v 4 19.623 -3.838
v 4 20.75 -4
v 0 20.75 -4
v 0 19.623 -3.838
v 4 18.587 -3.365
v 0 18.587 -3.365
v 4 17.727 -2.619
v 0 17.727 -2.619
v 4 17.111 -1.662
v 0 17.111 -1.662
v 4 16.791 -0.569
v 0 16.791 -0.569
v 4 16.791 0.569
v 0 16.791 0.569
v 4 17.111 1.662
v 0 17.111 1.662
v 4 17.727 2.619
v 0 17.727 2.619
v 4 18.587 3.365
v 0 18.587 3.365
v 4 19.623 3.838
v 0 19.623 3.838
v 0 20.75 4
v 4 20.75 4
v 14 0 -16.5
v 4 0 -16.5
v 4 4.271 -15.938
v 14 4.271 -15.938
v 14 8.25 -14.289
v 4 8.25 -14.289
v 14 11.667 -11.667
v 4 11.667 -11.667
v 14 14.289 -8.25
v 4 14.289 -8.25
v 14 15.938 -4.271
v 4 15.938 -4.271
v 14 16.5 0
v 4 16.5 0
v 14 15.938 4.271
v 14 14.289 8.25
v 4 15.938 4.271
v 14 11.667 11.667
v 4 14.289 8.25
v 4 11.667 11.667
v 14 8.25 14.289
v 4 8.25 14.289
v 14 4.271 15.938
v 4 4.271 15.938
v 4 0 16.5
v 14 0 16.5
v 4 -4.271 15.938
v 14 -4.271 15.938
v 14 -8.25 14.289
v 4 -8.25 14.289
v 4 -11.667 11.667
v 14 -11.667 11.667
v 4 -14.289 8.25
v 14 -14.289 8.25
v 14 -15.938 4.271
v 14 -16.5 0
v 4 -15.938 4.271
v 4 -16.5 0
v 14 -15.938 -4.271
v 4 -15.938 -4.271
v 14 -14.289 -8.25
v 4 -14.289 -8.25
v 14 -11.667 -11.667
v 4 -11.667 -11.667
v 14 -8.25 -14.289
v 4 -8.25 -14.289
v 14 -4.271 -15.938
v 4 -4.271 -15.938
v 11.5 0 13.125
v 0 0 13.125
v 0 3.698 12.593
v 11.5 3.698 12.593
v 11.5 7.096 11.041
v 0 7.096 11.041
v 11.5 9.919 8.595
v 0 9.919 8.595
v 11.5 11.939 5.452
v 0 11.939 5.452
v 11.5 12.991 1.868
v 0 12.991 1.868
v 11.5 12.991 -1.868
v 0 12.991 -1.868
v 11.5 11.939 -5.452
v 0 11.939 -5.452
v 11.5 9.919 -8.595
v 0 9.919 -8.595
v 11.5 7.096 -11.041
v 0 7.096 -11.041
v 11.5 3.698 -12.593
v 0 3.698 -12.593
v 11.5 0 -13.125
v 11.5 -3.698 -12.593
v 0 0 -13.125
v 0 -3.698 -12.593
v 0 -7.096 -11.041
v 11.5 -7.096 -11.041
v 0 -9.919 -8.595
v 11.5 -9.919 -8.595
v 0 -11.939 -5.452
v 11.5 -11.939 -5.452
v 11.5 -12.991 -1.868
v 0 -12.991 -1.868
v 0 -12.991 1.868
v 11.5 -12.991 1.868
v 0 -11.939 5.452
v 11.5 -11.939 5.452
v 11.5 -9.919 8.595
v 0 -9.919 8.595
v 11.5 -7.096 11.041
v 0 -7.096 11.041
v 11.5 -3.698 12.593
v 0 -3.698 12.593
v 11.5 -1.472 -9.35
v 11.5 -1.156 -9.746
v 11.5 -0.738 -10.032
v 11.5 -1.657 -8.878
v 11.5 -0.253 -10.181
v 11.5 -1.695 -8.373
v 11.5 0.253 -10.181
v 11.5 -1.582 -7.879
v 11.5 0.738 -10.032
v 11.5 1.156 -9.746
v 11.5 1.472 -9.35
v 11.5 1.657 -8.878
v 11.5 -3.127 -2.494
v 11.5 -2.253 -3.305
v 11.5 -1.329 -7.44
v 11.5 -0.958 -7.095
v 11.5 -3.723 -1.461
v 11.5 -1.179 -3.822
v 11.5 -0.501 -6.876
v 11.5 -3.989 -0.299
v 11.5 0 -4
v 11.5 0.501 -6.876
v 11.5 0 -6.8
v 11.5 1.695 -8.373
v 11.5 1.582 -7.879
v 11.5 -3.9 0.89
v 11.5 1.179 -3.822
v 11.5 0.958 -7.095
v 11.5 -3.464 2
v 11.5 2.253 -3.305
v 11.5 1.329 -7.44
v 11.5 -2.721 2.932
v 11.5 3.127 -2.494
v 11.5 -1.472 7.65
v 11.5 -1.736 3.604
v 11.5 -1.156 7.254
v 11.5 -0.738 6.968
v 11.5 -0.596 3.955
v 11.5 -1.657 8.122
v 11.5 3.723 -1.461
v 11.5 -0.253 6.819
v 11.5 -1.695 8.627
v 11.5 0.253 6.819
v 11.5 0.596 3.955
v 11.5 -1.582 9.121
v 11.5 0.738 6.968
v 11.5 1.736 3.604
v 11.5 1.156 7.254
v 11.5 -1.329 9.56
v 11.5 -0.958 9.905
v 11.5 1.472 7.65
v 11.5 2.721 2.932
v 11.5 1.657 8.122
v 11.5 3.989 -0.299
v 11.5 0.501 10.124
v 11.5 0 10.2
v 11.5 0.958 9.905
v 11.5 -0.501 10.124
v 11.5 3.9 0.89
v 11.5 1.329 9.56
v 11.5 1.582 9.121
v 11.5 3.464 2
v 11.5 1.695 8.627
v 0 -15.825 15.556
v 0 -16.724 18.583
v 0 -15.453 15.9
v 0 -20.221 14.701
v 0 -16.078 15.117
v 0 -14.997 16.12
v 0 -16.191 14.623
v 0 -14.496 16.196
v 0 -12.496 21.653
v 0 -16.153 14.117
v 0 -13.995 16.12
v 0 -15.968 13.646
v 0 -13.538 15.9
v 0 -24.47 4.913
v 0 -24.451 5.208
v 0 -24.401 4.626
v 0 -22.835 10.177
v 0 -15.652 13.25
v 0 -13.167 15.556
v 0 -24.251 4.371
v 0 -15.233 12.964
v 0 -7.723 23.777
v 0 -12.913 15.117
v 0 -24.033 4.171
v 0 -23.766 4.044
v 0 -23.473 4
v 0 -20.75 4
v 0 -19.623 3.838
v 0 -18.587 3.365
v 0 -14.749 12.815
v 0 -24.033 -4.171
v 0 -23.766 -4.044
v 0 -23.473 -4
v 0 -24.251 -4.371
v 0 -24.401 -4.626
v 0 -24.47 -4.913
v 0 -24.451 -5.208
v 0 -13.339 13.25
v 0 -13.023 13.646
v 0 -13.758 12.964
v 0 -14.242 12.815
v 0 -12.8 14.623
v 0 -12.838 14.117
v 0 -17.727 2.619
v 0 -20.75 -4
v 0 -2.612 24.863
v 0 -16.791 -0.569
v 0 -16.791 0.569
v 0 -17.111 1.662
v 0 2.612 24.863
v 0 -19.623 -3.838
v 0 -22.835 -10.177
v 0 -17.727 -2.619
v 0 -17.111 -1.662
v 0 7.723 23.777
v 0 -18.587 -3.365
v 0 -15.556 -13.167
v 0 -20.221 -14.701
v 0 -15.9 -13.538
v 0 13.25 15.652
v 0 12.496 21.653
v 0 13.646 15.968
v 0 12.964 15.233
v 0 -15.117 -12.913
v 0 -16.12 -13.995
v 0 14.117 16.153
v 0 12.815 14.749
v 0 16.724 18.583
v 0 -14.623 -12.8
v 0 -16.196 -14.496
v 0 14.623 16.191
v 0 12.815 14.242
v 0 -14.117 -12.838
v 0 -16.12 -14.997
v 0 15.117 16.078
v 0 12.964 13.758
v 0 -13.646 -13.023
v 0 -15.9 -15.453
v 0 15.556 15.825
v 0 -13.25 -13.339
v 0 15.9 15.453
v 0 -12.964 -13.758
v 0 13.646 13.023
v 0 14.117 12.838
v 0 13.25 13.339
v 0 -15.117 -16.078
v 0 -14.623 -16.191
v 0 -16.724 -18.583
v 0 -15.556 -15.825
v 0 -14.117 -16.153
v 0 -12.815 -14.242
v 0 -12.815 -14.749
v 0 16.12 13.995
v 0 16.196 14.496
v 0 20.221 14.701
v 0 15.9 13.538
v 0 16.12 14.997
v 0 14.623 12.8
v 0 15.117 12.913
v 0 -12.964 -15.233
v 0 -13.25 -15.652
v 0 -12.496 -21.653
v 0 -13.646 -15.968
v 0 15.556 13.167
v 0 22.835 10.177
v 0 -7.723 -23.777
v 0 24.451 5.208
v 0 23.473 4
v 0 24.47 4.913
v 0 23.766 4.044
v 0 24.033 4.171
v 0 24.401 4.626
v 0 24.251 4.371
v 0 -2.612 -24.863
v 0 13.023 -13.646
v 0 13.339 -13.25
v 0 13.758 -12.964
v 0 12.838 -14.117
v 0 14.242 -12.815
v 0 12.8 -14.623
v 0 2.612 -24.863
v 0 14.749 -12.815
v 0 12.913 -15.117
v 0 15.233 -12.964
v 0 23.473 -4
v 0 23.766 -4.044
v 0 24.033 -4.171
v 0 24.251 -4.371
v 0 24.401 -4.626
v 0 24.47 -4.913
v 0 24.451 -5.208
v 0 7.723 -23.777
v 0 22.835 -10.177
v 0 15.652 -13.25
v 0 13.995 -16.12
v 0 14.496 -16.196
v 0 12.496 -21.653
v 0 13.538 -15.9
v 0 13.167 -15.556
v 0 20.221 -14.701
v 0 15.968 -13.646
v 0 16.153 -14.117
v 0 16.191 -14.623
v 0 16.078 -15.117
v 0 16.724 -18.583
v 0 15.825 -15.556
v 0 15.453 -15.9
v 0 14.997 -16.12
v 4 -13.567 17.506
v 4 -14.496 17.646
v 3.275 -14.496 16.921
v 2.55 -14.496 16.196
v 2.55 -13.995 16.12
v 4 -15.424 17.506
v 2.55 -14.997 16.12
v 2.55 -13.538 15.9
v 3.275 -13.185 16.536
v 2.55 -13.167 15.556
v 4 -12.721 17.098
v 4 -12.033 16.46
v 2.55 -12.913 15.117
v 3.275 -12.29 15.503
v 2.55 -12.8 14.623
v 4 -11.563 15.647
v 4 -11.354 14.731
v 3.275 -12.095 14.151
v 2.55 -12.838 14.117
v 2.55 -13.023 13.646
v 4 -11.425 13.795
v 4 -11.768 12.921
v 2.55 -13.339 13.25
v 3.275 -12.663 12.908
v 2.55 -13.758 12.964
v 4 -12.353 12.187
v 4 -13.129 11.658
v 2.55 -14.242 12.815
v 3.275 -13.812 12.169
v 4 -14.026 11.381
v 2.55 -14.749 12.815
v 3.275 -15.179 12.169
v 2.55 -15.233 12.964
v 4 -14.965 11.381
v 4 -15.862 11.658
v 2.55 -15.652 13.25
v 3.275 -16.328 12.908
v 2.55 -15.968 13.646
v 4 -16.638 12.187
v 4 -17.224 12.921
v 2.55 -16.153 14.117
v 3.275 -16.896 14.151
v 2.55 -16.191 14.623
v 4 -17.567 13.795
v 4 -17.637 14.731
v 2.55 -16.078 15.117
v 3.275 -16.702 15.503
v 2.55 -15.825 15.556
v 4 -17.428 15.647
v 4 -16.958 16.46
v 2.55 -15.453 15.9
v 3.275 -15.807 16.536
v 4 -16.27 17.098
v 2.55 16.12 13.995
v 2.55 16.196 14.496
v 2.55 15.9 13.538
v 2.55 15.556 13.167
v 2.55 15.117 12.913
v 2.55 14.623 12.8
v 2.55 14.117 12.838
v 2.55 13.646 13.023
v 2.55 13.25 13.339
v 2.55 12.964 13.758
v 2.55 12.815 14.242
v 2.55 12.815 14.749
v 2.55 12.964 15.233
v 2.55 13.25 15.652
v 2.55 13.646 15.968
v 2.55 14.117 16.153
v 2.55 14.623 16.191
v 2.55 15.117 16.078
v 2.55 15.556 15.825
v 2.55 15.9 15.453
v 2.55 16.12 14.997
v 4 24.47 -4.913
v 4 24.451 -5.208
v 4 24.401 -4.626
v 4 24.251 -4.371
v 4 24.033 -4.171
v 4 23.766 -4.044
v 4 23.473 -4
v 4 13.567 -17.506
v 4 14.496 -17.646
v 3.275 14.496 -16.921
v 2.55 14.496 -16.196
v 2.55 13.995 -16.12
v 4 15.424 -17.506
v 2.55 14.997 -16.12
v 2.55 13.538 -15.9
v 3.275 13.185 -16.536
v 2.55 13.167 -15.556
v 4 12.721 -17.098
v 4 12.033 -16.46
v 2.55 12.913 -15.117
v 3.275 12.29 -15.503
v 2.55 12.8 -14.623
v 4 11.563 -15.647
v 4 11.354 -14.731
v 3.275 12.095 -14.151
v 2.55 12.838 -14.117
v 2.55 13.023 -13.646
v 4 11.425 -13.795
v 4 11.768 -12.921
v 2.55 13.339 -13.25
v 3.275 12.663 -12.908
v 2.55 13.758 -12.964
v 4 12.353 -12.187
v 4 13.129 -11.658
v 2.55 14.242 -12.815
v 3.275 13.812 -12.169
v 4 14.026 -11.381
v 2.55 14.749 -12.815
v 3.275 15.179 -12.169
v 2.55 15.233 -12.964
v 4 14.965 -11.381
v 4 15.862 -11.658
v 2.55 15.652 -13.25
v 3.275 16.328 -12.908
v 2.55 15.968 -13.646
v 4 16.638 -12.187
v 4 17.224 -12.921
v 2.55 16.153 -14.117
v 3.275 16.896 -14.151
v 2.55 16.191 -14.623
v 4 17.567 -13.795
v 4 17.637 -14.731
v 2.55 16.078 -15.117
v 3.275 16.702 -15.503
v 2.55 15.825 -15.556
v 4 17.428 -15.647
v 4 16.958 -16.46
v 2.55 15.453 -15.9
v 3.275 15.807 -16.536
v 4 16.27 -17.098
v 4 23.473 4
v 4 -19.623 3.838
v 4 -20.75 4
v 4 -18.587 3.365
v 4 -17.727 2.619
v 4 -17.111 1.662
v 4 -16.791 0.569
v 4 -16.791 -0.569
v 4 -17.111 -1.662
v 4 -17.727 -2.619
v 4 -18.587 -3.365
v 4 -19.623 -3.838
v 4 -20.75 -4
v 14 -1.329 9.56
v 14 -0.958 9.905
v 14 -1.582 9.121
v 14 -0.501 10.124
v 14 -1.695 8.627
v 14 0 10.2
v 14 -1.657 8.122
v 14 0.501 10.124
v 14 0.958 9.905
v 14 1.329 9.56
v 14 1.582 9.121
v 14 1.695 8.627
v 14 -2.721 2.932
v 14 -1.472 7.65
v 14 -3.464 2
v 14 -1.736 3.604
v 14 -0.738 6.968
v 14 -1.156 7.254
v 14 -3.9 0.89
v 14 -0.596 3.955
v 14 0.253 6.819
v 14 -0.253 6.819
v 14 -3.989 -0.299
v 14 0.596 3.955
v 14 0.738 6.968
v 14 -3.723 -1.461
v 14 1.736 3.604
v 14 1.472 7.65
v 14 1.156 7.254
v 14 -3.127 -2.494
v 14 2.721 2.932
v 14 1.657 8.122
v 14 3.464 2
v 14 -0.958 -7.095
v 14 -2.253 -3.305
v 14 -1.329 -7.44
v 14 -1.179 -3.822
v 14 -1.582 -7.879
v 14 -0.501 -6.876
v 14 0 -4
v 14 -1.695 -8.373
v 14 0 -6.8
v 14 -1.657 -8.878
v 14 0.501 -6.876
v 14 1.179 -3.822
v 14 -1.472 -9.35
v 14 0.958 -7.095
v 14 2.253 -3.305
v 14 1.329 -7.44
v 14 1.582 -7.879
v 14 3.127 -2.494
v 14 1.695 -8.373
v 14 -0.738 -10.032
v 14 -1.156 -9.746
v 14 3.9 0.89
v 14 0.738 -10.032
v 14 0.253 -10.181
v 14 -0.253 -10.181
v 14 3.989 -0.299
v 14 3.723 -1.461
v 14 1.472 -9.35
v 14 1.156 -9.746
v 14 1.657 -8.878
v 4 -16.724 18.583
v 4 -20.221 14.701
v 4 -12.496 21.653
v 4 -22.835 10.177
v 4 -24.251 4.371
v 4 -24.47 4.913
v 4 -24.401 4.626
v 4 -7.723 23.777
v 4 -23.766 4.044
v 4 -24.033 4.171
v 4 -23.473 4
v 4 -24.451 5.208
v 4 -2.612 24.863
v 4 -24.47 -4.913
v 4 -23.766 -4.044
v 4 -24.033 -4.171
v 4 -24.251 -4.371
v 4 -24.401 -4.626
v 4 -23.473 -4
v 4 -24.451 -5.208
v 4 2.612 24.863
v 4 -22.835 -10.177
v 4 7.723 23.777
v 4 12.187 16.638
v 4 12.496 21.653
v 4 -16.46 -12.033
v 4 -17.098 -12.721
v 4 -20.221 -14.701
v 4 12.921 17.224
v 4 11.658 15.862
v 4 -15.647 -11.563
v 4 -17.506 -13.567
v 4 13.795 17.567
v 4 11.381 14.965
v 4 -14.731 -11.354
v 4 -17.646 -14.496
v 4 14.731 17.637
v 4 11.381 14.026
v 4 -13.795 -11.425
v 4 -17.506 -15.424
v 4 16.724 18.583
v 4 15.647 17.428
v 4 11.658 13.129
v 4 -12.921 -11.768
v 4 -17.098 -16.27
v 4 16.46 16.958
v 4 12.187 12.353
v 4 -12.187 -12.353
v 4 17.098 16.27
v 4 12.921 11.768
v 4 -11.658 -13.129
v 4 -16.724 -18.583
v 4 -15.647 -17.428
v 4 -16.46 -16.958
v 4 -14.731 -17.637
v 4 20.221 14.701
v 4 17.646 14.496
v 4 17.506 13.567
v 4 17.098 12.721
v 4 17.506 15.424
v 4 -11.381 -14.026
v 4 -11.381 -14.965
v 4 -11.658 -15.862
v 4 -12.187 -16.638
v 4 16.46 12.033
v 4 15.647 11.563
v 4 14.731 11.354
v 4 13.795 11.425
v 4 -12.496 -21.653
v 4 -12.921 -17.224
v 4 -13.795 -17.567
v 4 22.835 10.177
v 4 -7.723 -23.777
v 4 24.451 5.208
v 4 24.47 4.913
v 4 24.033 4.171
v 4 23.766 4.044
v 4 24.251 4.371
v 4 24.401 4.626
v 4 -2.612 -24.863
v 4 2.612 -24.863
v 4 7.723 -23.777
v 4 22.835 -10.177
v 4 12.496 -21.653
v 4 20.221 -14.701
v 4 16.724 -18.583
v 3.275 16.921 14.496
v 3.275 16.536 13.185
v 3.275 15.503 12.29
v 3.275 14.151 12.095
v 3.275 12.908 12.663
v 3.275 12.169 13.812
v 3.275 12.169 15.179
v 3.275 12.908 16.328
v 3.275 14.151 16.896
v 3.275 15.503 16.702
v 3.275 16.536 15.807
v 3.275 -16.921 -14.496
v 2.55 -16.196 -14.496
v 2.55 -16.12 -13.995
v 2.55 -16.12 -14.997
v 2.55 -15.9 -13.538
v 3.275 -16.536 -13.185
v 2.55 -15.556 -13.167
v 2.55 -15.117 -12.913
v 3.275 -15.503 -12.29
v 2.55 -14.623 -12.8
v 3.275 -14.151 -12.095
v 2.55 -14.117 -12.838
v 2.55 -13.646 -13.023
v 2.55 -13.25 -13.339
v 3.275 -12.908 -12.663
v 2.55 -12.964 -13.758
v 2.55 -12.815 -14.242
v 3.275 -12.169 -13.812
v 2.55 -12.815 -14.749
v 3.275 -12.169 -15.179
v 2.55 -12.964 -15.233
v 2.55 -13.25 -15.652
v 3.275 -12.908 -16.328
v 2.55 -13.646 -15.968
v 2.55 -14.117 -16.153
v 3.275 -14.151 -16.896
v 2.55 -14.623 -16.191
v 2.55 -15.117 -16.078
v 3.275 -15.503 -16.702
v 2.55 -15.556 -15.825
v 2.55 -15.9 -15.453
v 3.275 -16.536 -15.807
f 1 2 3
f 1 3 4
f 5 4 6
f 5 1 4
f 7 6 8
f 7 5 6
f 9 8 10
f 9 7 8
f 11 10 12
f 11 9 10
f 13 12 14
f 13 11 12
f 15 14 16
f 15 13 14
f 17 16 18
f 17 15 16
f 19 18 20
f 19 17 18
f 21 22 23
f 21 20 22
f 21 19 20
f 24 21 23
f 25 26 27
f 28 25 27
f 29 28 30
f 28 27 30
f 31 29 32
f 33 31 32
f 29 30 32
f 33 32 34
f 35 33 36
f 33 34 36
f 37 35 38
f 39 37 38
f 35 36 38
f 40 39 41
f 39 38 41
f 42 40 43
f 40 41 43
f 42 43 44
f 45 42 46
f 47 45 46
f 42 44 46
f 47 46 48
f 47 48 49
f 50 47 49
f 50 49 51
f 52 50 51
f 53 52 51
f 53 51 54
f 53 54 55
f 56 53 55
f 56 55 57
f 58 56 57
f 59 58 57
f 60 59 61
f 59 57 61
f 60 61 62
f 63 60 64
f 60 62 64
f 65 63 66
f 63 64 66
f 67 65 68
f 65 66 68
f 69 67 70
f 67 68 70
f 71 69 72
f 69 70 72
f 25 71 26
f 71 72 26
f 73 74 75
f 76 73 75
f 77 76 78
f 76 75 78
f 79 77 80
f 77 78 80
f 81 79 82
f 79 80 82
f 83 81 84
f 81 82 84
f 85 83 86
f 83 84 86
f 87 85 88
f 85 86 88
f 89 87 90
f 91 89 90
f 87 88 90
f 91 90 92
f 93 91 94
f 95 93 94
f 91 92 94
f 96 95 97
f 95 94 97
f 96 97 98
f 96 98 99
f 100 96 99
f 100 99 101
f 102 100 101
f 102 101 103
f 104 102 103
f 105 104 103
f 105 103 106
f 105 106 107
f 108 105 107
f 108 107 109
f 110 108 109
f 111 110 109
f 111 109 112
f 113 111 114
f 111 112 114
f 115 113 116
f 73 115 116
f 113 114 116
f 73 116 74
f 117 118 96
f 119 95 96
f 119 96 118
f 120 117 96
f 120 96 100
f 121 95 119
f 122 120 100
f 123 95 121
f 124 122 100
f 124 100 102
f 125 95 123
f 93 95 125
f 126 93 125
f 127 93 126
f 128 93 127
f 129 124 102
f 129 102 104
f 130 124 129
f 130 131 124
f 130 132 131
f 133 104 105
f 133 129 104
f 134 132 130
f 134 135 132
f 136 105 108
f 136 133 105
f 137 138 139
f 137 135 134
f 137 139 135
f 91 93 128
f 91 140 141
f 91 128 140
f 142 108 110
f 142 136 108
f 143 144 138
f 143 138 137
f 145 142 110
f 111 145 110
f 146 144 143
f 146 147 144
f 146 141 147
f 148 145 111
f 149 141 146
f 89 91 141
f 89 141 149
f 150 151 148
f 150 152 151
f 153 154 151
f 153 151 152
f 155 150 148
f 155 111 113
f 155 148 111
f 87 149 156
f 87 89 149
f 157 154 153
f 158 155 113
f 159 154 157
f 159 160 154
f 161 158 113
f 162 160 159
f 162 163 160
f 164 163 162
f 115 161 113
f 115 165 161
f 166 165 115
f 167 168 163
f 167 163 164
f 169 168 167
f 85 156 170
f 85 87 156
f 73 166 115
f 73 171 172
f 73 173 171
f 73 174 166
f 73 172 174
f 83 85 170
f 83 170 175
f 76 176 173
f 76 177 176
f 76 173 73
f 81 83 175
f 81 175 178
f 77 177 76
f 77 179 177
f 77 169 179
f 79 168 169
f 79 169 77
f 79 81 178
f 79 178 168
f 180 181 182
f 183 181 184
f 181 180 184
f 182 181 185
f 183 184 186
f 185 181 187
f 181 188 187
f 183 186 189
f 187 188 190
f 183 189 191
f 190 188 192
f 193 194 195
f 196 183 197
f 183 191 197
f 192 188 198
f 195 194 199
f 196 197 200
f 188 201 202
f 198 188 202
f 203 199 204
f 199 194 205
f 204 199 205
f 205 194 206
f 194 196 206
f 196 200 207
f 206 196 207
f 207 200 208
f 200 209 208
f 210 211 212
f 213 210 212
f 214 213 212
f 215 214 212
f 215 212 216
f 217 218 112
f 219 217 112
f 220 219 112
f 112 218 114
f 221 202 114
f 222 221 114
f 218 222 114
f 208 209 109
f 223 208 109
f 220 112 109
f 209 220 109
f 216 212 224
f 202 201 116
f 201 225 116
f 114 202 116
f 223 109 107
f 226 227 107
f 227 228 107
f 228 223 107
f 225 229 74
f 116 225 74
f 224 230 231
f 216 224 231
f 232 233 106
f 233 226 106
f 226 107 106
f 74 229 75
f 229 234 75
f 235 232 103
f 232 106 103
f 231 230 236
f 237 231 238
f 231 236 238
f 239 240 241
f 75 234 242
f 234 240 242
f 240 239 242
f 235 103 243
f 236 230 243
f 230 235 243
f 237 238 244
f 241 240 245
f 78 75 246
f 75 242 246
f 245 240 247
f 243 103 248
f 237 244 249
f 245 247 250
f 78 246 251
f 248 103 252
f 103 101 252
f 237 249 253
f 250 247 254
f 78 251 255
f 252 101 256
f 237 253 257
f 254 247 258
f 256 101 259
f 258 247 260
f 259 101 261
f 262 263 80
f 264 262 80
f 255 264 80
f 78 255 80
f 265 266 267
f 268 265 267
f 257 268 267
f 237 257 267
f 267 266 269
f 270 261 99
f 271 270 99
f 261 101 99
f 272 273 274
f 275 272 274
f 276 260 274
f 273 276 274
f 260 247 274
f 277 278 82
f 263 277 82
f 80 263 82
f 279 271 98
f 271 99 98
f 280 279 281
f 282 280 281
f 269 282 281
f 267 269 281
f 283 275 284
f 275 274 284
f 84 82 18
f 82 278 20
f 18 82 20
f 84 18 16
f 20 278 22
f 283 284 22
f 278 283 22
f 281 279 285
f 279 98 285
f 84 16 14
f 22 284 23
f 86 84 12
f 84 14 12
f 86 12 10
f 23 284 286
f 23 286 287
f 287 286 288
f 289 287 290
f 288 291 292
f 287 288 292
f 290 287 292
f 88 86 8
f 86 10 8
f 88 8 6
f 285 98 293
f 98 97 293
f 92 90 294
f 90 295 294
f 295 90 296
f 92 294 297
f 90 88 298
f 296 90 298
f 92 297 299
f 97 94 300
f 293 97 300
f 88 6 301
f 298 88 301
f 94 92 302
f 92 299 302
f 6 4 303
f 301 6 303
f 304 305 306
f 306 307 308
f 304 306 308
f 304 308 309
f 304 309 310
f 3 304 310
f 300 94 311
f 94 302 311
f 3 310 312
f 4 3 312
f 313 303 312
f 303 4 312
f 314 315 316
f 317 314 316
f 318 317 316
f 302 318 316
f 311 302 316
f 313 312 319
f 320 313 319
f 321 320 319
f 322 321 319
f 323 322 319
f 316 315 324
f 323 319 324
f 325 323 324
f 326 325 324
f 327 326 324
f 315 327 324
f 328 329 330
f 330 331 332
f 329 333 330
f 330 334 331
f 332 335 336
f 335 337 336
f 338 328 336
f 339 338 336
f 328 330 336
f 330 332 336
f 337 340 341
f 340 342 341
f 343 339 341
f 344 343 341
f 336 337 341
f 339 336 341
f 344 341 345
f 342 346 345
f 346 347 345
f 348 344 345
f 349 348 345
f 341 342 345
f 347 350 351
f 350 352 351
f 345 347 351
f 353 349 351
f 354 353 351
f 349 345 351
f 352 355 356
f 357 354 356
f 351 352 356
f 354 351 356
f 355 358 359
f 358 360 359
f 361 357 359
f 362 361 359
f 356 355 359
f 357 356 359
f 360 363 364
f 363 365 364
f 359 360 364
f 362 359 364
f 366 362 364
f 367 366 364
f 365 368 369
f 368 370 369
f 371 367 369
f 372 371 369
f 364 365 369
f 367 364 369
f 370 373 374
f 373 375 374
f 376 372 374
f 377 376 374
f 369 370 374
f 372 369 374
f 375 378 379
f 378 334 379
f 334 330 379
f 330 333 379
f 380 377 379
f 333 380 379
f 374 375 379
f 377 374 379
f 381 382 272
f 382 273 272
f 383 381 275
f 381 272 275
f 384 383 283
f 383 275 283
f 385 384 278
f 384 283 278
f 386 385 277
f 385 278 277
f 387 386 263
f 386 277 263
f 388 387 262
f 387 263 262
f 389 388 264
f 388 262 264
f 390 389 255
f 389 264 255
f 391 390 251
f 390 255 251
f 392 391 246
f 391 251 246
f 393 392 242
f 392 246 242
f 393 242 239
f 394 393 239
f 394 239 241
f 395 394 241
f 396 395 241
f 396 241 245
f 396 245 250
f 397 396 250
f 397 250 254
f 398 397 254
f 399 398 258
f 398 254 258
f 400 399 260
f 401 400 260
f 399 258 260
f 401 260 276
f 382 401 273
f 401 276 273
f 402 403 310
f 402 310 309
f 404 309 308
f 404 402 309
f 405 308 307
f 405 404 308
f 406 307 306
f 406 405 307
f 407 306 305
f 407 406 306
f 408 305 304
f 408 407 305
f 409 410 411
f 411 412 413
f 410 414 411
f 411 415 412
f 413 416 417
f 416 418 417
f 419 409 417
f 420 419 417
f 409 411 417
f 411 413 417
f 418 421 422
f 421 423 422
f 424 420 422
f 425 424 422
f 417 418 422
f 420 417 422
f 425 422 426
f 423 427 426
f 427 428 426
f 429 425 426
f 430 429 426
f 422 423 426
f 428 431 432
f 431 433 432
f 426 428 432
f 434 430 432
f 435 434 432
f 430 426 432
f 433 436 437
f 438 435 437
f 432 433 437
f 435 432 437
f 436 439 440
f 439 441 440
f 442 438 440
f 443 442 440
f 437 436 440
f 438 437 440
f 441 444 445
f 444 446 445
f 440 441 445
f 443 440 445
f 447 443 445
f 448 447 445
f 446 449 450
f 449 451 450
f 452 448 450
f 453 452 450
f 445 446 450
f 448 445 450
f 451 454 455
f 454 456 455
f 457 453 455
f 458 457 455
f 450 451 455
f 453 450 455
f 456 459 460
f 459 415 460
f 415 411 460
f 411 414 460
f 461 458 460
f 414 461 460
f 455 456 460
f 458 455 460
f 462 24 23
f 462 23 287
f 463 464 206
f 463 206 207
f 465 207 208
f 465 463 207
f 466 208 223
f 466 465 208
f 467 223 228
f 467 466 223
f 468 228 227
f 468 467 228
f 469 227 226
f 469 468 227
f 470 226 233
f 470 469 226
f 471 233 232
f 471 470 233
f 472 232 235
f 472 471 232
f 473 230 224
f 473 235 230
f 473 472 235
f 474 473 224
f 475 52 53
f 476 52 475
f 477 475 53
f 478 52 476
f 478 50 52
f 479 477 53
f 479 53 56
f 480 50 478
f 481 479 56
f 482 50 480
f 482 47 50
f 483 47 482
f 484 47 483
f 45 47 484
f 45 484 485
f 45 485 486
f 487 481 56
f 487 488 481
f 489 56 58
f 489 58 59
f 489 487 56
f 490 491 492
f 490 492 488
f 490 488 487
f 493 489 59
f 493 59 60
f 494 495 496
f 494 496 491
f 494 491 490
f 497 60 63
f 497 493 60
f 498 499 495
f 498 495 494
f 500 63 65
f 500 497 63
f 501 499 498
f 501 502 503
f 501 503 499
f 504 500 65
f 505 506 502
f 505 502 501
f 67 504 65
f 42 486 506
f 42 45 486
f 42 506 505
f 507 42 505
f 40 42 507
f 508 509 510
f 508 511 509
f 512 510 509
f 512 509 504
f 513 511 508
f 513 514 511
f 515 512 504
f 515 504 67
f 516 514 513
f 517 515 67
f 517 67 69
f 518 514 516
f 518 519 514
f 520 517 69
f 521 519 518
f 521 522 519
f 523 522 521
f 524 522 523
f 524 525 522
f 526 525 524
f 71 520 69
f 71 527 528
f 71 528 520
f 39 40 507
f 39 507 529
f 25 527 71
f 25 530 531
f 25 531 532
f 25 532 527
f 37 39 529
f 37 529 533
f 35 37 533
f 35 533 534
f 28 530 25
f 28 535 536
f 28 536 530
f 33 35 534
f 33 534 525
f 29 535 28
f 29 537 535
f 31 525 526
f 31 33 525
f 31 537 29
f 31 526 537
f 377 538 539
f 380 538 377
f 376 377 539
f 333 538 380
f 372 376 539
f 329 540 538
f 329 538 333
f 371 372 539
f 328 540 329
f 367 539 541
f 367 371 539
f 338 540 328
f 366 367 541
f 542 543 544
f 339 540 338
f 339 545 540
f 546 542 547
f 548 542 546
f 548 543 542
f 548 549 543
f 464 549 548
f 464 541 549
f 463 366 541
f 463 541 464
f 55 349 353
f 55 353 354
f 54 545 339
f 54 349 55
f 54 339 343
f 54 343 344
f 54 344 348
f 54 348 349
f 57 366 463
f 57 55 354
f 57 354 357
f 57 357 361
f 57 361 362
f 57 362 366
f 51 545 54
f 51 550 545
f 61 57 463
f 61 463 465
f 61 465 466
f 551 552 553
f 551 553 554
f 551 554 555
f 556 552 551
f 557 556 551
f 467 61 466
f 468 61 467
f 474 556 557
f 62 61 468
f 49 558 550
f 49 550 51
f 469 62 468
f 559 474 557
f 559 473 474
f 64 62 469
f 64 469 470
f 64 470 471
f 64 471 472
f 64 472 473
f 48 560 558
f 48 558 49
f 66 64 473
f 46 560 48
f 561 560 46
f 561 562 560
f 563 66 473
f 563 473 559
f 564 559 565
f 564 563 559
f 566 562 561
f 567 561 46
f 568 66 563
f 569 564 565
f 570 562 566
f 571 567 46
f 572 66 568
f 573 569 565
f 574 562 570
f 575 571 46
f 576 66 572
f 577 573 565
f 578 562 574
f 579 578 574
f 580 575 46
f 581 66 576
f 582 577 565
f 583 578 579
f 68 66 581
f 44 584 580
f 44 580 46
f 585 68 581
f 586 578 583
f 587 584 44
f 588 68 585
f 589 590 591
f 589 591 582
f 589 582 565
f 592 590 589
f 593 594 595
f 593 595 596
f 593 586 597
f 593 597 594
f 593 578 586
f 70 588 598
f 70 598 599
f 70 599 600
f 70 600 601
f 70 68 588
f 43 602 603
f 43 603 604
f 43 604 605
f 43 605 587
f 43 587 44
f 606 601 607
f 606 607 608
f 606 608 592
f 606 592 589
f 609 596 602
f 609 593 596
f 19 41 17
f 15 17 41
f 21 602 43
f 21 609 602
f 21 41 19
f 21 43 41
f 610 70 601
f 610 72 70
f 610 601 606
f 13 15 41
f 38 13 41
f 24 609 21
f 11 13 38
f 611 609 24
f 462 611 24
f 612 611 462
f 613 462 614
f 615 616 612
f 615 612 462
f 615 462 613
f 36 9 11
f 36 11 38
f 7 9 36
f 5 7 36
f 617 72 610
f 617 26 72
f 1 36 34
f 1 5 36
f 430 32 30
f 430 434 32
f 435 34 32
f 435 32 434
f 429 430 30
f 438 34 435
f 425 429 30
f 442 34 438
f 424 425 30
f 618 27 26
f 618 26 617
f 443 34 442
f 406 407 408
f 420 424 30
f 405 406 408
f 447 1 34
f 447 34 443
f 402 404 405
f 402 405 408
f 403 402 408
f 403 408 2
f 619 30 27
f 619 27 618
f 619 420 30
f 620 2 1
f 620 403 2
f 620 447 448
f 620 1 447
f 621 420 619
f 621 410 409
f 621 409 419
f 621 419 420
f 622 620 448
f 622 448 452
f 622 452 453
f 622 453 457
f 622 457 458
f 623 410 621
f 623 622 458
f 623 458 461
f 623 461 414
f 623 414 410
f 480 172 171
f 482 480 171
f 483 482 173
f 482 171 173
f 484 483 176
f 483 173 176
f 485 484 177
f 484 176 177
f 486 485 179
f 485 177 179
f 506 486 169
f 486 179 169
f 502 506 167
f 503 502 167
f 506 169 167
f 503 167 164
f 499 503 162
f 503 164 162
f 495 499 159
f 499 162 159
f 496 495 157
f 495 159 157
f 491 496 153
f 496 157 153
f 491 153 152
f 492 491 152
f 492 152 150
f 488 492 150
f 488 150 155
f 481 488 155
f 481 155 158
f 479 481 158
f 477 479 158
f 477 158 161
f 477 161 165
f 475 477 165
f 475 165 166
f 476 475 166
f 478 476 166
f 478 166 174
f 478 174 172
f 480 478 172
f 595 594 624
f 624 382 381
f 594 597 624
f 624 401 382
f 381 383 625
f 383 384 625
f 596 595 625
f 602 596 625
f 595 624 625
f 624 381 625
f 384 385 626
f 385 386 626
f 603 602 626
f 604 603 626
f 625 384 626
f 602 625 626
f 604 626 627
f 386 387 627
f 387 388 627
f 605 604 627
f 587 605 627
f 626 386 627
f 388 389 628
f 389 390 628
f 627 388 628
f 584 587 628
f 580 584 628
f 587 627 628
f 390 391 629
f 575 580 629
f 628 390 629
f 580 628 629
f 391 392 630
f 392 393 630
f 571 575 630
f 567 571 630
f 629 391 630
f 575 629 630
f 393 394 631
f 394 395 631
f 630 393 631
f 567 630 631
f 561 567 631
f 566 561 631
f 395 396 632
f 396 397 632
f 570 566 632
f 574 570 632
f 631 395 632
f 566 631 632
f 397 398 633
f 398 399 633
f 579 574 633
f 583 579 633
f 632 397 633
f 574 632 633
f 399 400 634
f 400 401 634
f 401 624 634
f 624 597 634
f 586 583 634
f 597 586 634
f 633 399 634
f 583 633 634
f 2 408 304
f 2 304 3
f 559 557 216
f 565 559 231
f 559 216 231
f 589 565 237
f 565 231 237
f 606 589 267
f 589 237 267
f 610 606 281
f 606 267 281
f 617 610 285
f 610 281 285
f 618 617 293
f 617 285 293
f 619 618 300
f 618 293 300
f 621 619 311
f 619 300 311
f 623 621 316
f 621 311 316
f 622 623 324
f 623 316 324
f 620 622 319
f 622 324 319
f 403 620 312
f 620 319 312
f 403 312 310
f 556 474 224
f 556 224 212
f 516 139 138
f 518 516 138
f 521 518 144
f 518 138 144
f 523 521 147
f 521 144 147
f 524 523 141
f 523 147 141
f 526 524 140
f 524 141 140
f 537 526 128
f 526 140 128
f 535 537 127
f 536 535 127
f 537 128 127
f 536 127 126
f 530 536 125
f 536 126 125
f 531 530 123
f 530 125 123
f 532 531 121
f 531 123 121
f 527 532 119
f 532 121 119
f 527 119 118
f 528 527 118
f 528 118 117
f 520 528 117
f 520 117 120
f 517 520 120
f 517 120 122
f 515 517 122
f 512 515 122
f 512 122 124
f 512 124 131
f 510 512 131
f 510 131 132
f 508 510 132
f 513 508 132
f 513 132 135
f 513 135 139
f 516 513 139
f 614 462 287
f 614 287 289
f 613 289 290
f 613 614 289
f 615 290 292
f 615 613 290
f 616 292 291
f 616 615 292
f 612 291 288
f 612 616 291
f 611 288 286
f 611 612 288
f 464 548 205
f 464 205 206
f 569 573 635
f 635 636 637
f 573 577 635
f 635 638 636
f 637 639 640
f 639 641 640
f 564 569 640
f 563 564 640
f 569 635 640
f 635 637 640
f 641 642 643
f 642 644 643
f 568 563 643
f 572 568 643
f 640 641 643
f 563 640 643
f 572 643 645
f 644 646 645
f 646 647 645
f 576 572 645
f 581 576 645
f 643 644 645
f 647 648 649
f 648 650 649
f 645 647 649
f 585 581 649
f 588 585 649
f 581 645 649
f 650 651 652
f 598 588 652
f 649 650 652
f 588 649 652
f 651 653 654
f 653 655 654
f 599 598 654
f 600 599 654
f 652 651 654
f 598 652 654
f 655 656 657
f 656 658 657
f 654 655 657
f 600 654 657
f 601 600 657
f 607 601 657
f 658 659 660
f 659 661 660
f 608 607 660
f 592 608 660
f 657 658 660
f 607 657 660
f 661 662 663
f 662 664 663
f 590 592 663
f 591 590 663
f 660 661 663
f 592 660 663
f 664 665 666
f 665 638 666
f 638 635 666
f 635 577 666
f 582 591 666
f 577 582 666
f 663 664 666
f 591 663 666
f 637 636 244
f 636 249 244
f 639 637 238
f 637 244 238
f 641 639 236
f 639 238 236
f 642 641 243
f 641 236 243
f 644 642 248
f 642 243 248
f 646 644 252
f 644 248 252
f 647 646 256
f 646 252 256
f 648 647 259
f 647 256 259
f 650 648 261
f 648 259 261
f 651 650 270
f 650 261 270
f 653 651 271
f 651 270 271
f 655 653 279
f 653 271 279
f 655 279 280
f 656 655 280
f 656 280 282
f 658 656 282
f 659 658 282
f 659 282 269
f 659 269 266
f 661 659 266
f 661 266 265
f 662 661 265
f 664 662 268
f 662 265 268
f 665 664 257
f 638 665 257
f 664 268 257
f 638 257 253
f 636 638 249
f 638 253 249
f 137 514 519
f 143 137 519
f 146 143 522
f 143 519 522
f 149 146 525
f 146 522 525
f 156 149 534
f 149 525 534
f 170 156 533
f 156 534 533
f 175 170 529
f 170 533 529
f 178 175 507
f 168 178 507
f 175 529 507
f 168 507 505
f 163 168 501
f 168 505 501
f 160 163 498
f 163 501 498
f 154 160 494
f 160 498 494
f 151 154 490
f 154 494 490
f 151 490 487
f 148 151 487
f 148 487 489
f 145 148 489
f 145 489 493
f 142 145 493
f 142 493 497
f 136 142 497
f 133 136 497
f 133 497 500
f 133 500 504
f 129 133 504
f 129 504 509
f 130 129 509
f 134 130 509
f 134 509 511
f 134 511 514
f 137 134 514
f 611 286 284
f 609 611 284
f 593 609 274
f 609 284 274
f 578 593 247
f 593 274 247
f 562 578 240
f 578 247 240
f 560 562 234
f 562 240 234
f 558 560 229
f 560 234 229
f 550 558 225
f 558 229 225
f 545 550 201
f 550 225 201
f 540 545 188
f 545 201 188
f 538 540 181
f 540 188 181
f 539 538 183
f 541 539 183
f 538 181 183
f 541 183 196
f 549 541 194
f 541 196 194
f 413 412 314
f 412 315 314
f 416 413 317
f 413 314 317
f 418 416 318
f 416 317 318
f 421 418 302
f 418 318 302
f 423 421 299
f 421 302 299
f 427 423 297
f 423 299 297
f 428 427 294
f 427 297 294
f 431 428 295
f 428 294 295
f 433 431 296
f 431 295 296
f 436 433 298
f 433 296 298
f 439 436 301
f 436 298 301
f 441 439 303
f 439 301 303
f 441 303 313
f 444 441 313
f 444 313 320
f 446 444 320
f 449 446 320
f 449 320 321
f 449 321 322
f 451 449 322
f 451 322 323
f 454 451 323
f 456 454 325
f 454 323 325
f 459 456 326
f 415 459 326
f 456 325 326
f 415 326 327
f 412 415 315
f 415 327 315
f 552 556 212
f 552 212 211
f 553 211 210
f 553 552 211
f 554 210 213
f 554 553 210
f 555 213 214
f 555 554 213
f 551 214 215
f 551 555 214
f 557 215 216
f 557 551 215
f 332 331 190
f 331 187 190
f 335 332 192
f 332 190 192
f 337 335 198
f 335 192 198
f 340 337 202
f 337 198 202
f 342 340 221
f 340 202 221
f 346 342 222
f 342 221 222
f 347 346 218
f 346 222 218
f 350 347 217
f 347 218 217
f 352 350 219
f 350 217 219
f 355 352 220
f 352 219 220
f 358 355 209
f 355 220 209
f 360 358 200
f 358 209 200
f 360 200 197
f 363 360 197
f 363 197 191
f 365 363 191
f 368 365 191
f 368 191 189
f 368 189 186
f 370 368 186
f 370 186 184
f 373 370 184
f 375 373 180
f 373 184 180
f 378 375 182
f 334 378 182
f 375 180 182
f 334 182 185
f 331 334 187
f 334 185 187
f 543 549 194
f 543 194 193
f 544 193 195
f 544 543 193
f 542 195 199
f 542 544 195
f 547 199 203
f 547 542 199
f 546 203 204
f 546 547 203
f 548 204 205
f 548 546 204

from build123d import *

# Parameters (mm, degrees)
SKETCH1_R                                       = 25
BOSS_EXTRUDE1_DEPTH                             = 4
SKETCH2_R                                       = 16.5
BOSS_EXTRUDE2_DEPTH                             = 10
SKETCH3_R                                       = 12.5
CUT_EXTRUDE1_DEPTH                              = 11.5
SKETCH4_R                                       = 4
CUT_EXTRUDE2_DEPTH                              = 4
M3_CLEARANCE_HOLE1_D                            = 3.4
M3_CLEARANCE_HOLE1_DEPTH                        = 10
CSK_FOR_M3_FLAT_HEAD_MACHINE_SCREW1_D           = 3.4
CSK_FOR_M3_FLAT_HEAD_MACHINE_SCREW1_CSINK_D     = 6.3
CSK_FOR_M3_FLAT_HEAD_MACHINE_SCREW1_CSINK_ANGLE = 90
CIRPATTERN1_COUNT                               = 4
SKETCH10_R                                      = 13.125
CUT_EXTRUDE3_DEPTH                              = 11.5
CUT_EXTRUDE4_DEPTH                              = 10


with BuildPart() as part:
    # Sketch1 → Boss-Extrude1 (new body)
    with BuildSketch(Plane(origin=(0, 0, 0), x_dir=(0, 0, -1), z_dir=(1, 0, 0))):
        Circle(SKETCH1_R)
    extrude(amount=BOSS_EXTRUDE1_DEPTH)

    # Sketch2 → Boss-Extrude2 (add)
    with BuildSketch(Plane(origin=(4, 0, 0), x_dir=(0, 0, -1), z_dir=(1, 0, 0))):
        Circle(SKETCH2_R)
    extrude(amount=BOSS_EXTRUDE2_DEPTH)

    # Sketch3 → Cut-Extrude1 (cut)
    with BuildSketch(Plane.ZY):
        Circle(SKETCH3_R)
    extrude(amount=-CUT_EXTRUDE1_DEPTH, mode=Mode.SUBTRACT)

    # Sketch4 → Cut-Extrude2 (cut)
    with BuildSketch(Plane(origin=(14, 0, 0), x_dir=(0, 0, -1), z_dir=(1, 0, 0))):
        Circle(SKETCH4_R)
    extrude(amount=-CUT_EXTRUDE2_DEPTH, mode=Mode.SUBTRACT)

    # M3 Clearance Hole1
    with Locations(Plane(origin=(14, 0, 0), x_dir=(0, 0, -1), z_dir=(1, 0, 0))):
        with Locations((8.5, 0), (-8.5, 0)):
            Hole(M3_CLEARANCE_HOLE1_D / 2, depth=M3_CLEARANCE_HOLE1_DEPTH)

    # CSK for M3 Flat Head Machine Screw1 (through all)
    with Locations(Plane(origin=(4, 0, 0), x_dir=(0, 0, -1), z_dir=(1, 0, 0))):
        with Locations((-14.495689014, -14.495689014)):
            csk_for_m3_flat_head_machine_screw1 = CounterSinkHole(CSK_FOR_M3_FLAT_HEAD_MACHINE_SCREW1_D / 2, CSK_FOR_M3_FLAT_HEAD_MACHINE_SCREW1_CSINK_D / 2, counter_sink_angle=CSK_FOR_M3_FLAT_HEAD_MACHINE_SCREW1_CSINK_ANGLE)

    # CirPattern1: CSK for M3 Flat Head Machine Screw1 ×4 about axis
    cirpattern1_axis = Axis((0, 0, 0), (1, 0, 0))
    for i in range(1, CIRPATTERN1_COUNT):
        add(csk_for_m3_flat_head_machine_screw1.rotate(cirpattern1_axis, i * 360 / CIRPATTERN1_COUNT), mode=Mode.SUBTRACT)

    # Sketch10 → Cut-Extrude3 (cut)
    with BuildSketch(Plane.ZY):
        Circle(SKETCH10_R)
    extrude(amount=-CUT_EXTRUDE3_DEPTH, mode=Mode.SUBTRACT)

    # Sketch12 → Cut-Extrude4 (cut)
    with BuildSketch(Plane(origin=(4, 0, 0), x_dir=(0, 0, -1), z_dir=(1, 0, 0))):
        with BuildLine():
            Line((-4, 20.75), (-4, 23.473389189))
            ThreePointArc((-4, 23.473389189), (-4.37084713, 24.250670776), (-5.208333333, 24.451447071))
            ThreePointArc((-5.208333333, 24.451447071), (0, 25), (5.208333333, 24.451447071))
            ThreePointArc((5.208333333, 24.451447071), (4.37084713, 24.250670776), (4, 23.473389189))
            Line((4, 23.473389189), (4, 20.75))
            ThreePointArc((4, 20.75), (0, 16.75), (-4, 20.75))
        make_face()
        with BuildLine():
            Line((4, -20.75), (4, -23.473389189))
            ThreePointArc((4, -23.473389189), (4.37084713, -24.250670776), (5.208333333, -24.451447071))
            ThreePointArc((5.208333333, -24.451447071), (0, -25), (-5.208333333, -24.451447071))
            ThreePointArc((-5.208333333, -24.451447071), (-4.37084713, -24.250670776), (-4, -23.473389189))
            Line((-4, -23.473389189), (-4, -20.75))
            ThreePointArc((-4, -20.75), (0, -16.75), (4, -20.75))
        make_face()
    extrude(amount=-CUT_EXTRUDE4_DEPTH, mode=Mode.SUBTRACT)


solid = part.part
